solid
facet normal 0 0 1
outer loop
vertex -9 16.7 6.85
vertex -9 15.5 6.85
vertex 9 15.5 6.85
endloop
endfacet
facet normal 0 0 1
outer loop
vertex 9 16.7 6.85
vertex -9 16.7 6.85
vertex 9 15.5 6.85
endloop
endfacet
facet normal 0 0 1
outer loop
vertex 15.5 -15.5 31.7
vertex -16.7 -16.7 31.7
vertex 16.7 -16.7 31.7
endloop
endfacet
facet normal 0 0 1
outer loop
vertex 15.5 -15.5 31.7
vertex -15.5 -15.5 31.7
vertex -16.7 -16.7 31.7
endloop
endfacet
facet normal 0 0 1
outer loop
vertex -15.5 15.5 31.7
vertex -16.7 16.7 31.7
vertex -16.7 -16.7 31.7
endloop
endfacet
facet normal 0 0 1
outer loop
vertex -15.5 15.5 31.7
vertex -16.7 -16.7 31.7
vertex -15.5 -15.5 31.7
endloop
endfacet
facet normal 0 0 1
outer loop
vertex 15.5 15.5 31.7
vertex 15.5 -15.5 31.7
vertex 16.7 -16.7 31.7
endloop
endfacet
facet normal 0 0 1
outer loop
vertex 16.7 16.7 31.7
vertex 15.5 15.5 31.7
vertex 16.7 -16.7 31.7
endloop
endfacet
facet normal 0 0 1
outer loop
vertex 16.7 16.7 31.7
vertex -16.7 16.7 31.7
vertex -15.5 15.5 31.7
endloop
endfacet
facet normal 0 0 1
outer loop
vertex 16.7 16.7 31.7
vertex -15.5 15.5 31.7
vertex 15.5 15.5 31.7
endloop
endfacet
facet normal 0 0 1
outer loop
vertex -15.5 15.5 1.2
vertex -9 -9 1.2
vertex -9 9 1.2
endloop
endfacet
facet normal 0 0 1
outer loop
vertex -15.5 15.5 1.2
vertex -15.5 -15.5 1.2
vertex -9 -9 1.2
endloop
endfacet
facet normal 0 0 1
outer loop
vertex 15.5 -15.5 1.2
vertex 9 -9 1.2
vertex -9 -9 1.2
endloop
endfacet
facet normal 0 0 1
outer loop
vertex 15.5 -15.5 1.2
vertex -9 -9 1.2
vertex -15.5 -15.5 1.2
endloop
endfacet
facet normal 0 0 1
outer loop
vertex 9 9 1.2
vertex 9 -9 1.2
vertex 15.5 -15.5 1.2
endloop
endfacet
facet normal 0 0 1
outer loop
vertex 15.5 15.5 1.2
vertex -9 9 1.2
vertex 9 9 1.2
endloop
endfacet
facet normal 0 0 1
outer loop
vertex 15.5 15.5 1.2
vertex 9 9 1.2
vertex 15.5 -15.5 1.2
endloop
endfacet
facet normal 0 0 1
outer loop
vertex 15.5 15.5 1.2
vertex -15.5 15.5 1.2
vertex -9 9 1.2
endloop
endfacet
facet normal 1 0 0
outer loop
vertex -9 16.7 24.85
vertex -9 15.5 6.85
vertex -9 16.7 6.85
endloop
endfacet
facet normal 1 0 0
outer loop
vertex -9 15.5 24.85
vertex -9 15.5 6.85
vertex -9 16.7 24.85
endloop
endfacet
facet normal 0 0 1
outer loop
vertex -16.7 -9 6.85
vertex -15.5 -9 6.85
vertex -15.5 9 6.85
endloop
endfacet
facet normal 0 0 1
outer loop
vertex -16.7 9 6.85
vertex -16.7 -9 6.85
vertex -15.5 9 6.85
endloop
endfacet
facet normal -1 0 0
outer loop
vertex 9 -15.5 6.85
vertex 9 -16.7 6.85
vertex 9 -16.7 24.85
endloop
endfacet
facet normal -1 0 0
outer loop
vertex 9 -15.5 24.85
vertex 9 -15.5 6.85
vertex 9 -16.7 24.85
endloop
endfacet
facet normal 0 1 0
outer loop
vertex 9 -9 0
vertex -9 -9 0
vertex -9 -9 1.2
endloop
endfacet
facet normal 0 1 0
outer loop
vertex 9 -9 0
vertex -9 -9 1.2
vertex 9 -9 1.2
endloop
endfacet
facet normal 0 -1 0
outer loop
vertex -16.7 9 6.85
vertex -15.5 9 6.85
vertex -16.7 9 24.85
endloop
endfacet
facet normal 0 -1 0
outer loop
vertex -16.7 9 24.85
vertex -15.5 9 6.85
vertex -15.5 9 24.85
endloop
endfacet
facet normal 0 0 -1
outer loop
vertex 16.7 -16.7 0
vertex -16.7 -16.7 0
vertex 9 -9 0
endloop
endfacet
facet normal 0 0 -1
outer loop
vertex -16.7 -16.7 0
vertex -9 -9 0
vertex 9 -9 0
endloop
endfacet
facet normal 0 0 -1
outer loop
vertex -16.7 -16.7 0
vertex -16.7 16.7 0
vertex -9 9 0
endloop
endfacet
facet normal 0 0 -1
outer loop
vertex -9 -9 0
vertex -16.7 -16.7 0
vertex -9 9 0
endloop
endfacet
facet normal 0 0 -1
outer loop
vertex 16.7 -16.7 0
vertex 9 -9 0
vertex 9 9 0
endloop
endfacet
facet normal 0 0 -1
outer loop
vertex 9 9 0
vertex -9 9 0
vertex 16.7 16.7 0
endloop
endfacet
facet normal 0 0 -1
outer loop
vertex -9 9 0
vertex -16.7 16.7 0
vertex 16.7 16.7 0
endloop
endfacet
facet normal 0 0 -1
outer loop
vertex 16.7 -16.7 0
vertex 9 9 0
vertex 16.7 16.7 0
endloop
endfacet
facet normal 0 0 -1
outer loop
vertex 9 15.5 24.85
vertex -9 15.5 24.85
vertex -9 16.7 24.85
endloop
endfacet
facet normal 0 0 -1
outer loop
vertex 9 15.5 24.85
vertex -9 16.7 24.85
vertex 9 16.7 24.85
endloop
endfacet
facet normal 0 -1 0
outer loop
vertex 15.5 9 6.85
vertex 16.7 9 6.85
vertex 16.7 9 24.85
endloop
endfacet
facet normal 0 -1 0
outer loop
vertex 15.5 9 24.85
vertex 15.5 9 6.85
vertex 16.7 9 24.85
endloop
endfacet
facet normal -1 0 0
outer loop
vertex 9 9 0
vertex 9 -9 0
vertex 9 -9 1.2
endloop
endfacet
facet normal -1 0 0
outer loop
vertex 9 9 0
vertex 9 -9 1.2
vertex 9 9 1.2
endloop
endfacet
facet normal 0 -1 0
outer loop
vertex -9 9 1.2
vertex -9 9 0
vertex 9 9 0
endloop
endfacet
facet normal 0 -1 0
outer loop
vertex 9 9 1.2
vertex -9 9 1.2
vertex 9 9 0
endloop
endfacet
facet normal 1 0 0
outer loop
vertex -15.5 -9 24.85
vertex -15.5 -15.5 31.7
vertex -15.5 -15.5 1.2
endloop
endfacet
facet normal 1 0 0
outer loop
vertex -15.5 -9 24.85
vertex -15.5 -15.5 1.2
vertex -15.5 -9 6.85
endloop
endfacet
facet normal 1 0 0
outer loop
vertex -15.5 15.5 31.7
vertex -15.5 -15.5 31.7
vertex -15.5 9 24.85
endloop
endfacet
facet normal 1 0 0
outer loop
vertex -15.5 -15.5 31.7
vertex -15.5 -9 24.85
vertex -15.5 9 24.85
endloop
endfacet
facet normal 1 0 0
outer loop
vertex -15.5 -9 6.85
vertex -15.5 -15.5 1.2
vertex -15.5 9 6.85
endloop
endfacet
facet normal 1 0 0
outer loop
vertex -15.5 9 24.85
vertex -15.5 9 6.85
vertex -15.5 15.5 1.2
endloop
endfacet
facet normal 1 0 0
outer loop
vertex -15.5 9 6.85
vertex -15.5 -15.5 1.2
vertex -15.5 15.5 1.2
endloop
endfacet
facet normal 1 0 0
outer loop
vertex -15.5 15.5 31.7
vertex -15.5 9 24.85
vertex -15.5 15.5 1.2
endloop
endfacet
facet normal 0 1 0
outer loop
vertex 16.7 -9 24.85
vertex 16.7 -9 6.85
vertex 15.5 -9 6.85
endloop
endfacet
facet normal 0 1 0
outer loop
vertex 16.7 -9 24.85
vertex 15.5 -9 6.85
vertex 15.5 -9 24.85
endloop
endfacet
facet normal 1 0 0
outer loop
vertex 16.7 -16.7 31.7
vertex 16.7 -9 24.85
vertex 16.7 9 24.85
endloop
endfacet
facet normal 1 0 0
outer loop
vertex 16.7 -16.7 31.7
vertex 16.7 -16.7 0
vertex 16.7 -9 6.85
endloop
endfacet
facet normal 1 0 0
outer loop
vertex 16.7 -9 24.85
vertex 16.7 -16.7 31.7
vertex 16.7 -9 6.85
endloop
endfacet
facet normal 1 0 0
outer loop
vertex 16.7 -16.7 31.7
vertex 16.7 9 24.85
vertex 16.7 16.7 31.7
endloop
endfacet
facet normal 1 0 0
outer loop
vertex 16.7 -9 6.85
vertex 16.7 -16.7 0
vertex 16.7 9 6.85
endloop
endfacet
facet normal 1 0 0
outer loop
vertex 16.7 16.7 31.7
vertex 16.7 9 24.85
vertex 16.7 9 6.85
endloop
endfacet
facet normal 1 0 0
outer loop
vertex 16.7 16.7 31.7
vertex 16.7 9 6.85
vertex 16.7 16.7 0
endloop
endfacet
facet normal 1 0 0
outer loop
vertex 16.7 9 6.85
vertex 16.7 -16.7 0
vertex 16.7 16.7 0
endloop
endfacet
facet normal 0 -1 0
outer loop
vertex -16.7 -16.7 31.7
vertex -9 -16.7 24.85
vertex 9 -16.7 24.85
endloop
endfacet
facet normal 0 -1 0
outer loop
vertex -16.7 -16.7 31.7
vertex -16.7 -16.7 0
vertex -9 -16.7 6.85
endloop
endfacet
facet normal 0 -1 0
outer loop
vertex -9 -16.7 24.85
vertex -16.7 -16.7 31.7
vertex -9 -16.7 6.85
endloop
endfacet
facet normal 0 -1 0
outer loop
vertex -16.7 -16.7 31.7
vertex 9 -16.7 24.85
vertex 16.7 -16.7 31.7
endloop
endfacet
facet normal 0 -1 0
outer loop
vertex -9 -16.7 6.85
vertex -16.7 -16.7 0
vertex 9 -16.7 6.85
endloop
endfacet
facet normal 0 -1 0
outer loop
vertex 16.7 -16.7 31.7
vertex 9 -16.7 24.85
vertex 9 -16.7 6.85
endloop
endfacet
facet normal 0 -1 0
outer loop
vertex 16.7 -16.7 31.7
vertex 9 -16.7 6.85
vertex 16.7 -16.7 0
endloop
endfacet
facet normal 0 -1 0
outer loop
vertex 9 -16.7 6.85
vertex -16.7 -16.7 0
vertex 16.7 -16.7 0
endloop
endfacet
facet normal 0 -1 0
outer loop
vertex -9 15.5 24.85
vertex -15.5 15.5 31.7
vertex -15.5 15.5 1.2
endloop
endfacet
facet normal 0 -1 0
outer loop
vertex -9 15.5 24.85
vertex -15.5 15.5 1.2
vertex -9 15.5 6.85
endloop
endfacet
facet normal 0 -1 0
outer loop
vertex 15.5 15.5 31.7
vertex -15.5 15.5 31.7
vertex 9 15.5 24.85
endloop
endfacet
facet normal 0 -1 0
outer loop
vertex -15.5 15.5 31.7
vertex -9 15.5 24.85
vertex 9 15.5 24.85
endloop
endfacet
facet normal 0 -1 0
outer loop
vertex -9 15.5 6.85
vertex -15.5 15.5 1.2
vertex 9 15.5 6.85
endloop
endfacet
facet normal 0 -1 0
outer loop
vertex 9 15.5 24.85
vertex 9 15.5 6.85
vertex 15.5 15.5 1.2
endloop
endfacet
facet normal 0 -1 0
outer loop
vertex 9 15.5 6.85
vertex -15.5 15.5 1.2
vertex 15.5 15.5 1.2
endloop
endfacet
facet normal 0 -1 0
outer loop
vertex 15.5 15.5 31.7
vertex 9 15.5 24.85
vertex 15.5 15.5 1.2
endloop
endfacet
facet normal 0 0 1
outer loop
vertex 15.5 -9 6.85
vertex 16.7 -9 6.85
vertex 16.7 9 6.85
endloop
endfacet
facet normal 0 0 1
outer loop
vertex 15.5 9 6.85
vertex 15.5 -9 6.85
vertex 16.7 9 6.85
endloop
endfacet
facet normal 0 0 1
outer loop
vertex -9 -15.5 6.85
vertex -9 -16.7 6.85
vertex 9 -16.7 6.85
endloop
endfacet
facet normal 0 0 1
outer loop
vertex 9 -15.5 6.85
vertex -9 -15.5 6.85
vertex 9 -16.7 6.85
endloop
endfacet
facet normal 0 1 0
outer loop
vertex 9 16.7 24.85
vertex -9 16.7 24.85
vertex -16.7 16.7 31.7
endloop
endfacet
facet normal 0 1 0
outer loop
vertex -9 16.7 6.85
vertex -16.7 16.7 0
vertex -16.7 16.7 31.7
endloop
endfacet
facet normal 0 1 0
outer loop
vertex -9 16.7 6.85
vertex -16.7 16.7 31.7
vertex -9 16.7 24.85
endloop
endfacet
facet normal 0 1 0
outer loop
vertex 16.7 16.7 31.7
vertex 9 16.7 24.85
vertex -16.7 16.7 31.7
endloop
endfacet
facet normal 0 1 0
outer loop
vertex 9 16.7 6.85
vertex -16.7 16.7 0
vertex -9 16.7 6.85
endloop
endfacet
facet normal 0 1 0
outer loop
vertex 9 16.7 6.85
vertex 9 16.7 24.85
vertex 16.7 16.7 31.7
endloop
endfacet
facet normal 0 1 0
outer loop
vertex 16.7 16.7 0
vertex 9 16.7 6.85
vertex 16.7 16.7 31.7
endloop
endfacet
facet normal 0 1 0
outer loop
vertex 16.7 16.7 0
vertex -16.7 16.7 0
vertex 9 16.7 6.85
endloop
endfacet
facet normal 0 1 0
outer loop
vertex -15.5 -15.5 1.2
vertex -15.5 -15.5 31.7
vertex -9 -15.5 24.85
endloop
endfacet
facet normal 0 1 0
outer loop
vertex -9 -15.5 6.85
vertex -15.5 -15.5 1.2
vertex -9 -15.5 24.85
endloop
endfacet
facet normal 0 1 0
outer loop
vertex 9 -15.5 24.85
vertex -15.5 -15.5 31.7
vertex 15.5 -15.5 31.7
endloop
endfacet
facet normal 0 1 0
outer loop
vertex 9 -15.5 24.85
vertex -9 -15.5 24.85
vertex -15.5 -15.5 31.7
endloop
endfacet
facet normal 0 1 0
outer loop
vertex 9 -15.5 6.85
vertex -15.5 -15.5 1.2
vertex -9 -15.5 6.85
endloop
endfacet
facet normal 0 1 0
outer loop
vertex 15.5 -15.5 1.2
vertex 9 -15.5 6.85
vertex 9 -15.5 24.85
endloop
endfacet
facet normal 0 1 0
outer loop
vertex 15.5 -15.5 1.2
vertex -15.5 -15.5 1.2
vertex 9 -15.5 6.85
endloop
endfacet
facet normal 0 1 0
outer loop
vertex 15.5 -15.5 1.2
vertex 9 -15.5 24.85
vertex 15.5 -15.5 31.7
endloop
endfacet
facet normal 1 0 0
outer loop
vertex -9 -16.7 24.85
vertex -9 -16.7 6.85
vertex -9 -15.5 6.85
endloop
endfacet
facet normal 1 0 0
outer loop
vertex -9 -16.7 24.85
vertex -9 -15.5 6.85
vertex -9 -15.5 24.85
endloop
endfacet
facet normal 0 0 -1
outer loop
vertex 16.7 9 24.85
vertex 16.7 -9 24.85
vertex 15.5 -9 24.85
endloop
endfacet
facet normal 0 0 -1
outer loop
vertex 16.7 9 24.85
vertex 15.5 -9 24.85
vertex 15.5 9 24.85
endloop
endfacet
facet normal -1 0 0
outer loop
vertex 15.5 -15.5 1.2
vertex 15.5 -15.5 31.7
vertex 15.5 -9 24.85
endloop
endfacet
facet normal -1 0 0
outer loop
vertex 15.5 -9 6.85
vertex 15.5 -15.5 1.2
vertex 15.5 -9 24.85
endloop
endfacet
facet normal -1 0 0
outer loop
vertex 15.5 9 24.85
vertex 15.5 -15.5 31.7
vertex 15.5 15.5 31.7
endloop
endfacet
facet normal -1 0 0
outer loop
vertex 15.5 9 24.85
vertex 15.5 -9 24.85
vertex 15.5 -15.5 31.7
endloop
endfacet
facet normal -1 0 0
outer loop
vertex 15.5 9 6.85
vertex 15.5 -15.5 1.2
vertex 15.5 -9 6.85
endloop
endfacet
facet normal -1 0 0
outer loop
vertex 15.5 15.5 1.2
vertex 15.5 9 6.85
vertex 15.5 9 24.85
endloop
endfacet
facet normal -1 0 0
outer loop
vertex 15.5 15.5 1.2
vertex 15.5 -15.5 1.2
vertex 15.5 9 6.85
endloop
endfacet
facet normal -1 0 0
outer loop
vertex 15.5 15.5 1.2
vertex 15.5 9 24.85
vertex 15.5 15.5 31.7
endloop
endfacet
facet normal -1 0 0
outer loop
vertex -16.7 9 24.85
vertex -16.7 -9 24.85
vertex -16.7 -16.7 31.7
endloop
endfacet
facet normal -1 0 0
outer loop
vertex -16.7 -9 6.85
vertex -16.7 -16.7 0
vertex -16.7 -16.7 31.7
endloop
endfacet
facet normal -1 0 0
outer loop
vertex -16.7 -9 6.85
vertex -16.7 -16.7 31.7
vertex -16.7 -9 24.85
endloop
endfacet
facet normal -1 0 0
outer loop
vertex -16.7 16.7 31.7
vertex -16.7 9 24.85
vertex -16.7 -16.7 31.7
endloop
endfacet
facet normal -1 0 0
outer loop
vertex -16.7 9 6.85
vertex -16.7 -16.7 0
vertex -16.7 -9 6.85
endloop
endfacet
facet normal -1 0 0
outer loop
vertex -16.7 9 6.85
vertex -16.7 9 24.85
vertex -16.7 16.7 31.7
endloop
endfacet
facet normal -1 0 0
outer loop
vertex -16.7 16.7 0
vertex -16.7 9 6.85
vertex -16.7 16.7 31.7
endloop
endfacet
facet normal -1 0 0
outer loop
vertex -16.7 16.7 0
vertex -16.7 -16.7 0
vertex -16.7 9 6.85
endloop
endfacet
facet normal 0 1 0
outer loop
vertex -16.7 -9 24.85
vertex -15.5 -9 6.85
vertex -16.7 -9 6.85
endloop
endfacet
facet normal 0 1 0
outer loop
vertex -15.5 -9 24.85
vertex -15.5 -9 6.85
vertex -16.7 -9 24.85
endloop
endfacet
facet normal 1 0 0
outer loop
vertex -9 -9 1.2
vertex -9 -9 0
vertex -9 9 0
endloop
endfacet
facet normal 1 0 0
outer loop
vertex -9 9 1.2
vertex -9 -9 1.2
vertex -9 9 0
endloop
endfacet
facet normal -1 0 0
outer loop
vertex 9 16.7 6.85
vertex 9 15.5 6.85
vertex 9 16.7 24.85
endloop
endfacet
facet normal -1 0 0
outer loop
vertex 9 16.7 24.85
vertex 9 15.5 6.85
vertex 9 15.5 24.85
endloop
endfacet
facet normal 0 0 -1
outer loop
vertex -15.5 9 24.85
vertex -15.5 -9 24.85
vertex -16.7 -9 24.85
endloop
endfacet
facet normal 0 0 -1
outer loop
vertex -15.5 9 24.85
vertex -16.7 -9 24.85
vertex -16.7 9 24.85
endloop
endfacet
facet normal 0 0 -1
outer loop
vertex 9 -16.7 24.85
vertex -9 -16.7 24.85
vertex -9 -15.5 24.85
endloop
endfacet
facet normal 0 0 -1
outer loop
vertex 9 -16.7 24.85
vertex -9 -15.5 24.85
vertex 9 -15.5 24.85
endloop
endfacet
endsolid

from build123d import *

# Parameters (mm, degrees)
F0_W     = 33.4
F0_H     = 33.4
F0_W_2   = 31
F0_H_2   = 31
F1_DEPTH = 31.7
F2_DEPTH = 1.2
F3_W     = 18
F3_H     = 18
F4_DEPTH = 33.401
F5_W     = 18
F5_H     = 18
F6_DEPTH = 33.401
F7_W     = 18
F7_H     = 18
F8_DEPTH = 31.701


with BuildPart() as f1:
    # F0 (on Top) → F1 (new body)
    with BuildSketch(Plane.XY):
        Rectangle(F0_W, F0_H)
        Rectangle(F0_W_2, F0_H_2, mode=Mode.SUBTRACT)
    extrude(amount=F1_DEPTH)

    # F0 (on Top) → F2 (join)
    with BuildSketch(Plane.XY):
        Rectangle(F0_W_2, F0_H_2)
    extrude(amount=F2_DEPTH)

    # F3 (on face) → F4 (cut, through all)
    with BuildSketch(Plane.XZ.offset(16.7)):
        with Locations((0, 15.85)):
            Rectangle(F3_W, F3_H)
    extrude(amount=-F4_DEPTH, mode=Mode.SUBTRACT)

    # F5 (on face) → F6 (cut, through all)
    with BuildSketch(Plane.YZ.offset(16.7)):
        with Locations((0, 15.85)):
            Rectangle(F5_W, F5_H)
    extrude(amount=-F6_DEPTH, mode=Mode.SUBTRACT)

    # F7 (on face) → F8 (cut, through all)
    with BuildSketch(Plane.XY):
        Rectangle(F7_W, F7_H)
    extrude(amount=F8_DEPTH, mode=Mode.SUBTRACT)


solid = f1.part
